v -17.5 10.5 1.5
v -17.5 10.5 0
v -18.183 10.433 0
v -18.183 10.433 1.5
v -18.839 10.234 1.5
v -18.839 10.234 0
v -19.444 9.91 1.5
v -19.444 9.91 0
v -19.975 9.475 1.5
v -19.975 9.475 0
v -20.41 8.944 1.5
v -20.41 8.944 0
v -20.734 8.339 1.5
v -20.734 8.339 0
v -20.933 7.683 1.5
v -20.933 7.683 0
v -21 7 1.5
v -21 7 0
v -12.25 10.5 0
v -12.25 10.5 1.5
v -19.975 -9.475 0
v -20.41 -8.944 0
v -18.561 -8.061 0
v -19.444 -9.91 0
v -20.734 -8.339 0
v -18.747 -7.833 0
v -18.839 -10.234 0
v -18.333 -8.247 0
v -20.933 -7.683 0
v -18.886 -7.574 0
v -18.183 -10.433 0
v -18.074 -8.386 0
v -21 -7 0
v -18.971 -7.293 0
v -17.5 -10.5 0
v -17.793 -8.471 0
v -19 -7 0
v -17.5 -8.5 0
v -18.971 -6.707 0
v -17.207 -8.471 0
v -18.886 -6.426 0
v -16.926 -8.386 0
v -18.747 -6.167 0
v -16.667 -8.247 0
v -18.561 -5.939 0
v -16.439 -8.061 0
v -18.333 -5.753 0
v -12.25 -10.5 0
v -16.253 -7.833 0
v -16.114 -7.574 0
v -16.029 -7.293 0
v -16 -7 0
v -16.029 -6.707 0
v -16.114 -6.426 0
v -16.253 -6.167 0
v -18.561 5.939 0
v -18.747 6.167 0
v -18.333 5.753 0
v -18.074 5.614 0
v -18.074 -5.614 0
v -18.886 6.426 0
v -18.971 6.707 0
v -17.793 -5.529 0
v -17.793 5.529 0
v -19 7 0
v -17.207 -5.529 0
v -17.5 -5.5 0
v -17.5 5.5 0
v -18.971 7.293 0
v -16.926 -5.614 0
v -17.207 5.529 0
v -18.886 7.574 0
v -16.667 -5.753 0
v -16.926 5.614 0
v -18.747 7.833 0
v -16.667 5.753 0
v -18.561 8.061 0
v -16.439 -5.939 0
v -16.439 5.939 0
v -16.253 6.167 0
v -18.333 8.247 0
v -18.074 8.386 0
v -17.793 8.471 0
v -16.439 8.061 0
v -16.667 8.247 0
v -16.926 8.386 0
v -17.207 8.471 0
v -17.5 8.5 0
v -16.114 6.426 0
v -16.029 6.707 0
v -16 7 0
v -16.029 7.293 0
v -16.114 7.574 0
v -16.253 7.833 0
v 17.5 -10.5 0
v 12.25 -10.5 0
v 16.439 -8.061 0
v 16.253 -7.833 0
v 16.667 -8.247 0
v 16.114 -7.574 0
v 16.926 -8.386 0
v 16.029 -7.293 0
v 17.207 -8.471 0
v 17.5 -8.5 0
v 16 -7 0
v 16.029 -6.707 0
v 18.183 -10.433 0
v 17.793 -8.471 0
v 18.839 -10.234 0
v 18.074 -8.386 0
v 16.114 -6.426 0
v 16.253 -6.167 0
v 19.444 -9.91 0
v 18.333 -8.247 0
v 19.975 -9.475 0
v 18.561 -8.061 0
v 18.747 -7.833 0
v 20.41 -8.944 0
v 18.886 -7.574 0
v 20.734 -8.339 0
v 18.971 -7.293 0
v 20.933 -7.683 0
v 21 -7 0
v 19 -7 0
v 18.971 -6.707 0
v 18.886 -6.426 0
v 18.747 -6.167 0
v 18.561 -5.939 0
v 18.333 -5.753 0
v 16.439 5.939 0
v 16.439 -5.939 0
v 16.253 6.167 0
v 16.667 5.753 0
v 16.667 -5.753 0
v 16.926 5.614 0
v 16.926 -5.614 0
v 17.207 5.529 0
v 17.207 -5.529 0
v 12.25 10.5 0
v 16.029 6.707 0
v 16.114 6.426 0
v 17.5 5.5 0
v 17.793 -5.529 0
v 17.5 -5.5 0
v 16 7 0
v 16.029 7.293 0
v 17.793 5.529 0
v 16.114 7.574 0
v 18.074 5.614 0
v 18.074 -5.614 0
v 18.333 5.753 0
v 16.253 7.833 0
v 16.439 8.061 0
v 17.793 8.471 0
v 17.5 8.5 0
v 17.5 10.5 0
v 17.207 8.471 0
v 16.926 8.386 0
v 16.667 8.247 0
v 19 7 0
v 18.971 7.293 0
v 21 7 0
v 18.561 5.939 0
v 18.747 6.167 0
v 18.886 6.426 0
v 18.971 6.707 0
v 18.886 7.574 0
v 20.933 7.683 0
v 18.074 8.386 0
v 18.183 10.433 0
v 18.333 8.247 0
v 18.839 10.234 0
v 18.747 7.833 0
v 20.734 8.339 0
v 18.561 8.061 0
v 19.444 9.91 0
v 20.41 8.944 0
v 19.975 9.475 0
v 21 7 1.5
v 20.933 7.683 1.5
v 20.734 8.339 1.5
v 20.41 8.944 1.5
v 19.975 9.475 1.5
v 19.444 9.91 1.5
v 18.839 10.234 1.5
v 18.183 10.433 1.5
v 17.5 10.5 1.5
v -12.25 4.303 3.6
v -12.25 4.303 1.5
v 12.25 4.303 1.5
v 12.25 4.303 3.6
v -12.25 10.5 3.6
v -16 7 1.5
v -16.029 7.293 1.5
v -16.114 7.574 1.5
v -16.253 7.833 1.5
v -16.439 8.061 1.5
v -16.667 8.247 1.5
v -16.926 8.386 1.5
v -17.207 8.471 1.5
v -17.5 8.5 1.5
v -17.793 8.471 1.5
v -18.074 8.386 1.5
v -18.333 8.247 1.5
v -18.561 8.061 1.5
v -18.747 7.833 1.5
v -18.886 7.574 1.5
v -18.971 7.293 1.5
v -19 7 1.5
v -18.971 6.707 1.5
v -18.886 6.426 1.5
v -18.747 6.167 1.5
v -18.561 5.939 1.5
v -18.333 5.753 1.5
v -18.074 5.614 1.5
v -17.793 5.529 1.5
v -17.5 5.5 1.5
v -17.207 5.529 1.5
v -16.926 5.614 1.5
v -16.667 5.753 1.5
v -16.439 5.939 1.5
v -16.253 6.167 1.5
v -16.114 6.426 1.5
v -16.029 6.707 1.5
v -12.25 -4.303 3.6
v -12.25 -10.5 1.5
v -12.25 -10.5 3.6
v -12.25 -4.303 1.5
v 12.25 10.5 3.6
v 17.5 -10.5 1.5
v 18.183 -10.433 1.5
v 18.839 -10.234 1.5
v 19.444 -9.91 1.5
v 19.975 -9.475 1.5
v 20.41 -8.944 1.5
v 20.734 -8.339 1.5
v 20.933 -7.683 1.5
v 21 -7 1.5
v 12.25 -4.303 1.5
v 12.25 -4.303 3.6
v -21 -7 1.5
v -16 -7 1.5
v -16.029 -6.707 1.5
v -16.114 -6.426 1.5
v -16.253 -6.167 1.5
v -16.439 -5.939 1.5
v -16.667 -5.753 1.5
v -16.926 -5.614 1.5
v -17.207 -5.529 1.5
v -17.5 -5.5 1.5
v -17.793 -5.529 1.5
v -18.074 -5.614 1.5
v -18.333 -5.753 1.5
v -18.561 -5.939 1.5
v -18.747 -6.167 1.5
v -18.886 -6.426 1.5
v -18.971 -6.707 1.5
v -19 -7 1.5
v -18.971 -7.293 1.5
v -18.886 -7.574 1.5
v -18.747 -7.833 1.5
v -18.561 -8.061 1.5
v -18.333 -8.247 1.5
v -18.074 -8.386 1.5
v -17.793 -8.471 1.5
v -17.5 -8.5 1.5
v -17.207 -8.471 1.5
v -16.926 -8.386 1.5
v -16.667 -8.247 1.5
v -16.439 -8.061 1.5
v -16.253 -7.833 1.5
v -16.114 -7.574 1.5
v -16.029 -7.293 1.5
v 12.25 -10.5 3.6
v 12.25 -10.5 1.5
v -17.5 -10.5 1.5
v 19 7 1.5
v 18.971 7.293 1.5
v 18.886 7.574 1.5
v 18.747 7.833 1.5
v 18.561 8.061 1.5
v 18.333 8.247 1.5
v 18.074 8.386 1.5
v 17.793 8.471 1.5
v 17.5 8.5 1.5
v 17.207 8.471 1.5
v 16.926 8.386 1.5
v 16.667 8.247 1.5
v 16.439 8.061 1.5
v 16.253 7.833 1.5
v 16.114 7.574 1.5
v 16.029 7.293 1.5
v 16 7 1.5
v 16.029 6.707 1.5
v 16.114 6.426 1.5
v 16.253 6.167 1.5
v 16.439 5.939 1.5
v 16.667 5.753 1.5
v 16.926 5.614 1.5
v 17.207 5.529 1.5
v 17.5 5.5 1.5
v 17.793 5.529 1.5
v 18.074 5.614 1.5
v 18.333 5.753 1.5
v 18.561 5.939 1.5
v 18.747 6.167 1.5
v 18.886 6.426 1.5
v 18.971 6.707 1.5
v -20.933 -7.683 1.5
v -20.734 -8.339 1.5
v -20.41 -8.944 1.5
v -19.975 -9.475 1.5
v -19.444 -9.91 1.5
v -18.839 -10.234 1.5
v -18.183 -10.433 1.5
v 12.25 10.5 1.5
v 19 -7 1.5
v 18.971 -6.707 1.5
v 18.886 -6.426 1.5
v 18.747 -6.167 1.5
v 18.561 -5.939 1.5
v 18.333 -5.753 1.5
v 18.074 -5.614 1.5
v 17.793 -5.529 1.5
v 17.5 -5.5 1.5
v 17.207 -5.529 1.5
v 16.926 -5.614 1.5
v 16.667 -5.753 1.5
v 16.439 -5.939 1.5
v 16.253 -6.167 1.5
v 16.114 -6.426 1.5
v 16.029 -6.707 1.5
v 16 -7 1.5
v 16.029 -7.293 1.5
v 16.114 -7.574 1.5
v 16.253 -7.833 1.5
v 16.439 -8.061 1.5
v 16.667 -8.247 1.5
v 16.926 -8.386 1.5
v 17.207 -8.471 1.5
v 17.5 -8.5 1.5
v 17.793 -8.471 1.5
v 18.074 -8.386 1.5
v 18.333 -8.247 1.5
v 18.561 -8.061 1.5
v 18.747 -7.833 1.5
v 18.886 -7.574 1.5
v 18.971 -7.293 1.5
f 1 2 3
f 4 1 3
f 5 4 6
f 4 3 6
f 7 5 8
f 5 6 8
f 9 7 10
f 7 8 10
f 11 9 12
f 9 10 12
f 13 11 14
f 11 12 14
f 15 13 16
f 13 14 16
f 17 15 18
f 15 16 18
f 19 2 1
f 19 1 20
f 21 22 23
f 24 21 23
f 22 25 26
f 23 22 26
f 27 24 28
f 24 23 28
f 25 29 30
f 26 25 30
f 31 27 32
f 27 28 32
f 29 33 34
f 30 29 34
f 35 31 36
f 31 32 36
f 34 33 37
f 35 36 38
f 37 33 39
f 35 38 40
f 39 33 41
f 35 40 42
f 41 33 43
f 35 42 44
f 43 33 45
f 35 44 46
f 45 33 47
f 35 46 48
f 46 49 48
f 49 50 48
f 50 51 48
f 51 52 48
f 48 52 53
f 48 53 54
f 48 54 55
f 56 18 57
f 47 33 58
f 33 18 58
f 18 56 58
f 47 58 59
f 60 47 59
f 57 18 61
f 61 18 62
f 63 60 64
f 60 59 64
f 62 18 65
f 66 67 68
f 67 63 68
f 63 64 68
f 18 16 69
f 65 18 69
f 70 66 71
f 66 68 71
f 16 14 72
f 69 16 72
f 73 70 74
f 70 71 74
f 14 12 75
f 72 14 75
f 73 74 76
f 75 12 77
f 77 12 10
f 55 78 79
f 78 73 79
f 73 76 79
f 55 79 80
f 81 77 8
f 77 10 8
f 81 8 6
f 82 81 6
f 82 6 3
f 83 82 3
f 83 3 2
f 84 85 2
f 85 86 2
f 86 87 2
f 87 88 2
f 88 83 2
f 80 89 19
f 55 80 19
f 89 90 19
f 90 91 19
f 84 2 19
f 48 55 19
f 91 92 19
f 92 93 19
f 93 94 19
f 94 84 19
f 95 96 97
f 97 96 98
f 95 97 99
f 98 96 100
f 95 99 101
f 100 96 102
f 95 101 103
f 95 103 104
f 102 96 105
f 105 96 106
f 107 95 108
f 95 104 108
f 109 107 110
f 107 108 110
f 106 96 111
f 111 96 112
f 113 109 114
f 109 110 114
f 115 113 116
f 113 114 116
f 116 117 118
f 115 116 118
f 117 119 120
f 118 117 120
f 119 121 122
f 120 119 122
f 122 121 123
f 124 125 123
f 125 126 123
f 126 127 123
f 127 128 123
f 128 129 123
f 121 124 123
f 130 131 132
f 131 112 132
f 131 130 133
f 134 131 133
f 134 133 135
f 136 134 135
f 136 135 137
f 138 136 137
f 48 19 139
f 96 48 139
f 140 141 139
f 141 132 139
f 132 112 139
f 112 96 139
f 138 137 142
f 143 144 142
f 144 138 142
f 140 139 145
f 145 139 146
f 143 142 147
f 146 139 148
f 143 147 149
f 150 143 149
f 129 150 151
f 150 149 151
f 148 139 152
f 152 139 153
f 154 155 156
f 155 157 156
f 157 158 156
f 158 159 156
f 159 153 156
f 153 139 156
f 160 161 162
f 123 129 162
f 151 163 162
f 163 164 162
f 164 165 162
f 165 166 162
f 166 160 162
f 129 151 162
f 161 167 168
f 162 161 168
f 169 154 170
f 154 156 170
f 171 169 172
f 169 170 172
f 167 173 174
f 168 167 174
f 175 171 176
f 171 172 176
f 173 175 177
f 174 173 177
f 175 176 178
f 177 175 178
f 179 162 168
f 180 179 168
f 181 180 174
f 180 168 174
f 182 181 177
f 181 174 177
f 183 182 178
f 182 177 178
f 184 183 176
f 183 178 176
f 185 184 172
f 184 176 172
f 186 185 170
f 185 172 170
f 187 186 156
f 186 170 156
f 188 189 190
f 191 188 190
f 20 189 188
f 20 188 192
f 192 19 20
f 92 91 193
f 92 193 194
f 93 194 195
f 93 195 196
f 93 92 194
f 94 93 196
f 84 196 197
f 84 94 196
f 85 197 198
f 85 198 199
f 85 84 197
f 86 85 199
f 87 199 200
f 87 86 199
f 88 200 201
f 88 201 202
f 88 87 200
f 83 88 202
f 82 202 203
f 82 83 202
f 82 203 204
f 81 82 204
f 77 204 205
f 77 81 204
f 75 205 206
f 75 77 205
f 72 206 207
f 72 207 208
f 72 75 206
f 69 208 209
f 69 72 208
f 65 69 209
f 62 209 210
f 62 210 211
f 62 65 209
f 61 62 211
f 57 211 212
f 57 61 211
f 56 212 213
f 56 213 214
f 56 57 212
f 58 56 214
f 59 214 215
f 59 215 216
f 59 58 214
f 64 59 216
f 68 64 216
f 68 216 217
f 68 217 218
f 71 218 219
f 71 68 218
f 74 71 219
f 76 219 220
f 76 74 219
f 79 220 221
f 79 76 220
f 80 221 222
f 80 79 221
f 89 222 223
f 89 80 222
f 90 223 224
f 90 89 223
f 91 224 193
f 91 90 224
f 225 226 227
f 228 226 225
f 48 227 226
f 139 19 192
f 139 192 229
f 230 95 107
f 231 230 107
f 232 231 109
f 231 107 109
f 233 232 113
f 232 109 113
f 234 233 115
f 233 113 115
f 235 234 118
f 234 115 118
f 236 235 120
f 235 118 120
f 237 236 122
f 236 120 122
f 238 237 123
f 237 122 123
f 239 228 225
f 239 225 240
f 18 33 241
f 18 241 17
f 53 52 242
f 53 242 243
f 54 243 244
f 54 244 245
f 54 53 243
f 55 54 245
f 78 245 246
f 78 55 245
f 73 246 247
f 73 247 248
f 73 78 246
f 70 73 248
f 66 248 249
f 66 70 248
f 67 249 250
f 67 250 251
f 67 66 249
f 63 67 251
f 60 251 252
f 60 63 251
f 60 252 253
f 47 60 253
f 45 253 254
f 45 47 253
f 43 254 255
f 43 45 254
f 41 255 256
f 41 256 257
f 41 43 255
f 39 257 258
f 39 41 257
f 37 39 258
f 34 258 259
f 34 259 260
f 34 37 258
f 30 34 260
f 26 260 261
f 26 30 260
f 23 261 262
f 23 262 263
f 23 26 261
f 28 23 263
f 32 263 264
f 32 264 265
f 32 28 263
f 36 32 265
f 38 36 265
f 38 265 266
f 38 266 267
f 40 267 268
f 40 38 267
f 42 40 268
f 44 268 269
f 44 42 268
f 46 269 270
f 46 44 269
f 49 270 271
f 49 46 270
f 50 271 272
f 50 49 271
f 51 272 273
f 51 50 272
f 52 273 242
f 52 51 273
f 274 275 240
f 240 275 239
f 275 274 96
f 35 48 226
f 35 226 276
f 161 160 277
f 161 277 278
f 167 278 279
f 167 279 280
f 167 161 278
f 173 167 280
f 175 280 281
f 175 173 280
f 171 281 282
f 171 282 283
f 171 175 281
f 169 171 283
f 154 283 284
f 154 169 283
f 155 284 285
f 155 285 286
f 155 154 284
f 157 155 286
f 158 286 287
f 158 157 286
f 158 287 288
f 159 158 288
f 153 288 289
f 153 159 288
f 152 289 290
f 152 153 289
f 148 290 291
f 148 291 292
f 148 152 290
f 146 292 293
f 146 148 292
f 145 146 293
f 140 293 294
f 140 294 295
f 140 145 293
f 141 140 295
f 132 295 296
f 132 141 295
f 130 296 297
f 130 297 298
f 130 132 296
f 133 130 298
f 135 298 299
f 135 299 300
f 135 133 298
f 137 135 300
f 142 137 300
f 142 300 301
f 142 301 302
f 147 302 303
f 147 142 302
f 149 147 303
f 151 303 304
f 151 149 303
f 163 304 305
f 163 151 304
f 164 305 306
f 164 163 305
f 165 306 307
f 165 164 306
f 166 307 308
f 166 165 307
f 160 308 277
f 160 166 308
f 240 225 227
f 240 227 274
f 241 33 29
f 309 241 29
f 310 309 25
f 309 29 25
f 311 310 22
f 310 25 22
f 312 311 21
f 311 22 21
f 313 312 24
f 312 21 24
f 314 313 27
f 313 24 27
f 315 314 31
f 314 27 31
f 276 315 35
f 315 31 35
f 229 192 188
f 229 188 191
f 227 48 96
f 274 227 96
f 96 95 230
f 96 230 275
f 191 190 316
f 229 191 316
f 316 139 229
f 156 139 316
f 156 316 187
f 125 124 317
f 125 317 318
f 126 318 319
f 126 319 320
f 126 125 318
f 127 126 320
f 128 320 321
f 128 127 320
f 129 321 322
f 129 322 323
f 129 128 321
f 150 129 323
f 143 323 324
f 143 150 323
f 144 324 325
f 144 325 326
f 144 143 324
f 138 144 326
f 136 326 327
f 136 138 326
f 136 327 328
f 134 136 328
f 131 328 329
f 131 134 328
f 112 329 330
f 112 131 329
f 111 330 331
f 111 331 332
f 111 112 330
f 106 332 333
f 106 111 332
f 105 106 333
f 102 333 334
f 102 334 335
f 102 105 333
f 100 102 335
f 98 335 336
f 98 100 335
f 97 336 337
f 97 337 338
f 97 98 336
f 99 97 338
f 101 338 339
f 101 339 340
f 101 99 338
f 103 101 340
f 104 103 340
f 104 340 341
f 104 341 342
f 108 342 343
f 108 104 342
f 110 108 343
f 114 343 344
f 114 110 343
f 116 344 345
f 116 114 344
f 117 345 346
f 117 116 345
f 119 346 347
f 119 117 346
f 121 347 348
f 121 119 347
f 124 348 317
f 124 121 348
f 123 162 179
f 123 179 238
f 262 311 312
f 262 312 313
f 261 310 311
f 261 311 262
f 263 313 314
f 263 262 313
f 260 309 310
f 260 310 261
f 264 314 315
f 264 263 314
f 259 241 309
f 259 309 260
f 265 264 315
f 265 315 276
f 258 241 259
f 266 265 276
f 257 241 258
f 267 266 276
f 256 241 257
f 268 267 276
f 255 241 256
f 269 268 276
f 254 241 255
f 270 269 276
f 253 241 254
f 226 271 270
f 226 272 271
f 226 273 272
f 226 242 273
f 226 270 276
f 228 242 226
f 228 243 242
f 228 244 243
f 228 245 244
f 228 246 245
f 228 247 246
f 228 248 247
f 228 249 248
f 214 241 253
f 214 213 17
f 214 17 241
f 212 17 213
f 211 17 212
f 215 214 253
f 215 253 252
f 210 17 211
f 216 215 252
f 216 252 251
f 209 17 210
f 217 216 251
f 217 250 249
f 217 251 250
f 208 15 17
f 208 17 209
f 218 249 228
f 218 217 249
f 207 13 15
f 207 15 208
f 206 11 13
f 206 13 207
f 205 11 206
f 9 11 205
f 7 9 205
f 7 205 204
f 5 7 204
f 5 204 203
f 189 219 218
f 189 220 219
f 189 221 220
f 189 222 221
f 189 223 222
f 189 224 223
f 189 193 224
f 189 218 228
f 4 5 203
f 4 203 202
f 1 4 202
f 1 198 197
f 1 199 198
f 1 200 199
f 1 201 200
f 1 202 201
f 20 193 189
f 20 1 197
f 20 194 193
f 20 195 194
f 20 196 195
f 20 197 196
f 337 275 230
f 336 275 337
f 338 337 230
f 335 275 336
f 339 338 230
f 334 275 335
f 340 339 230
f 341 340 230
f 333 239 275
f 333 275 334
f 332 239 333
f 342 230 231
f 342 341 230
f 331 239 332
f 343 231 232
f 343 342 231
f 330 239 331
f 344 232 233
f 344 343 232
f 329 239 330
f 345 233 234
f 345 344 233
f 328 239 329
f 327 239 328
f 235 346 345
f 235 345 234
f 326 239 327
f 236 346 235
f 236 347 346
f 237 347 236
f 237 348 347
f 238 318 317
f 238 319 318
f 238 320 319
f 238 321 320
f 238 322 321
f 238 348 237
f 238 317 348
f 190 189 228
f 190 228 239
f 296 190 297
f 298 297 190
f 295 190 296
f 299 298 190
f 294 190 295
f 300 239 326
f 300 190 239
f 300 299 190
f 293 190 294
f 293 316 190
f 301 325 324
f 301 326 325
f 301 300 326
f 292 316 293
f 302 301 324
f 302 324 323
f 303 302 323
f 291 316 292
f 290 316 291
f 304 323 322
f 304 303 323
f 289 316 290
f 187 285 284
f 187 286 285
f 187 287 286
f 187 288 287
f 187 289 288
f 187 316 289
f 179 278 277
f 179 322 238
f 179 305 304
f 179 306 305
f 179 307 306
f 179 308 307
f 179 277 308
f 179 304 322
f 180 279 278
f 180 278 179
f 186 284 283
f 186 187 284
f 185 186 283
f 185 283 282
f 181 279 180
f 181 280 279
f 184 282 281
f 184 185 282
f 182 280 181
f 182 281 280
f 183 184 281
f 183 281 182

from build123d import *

# Parameters (mm, degrees)
SKETCH_R     = 1.5
PAD_DEPTH    = 1.5
SKETCH001_W  = 24.5
SKETCH001_H  = 6.196515
PAD001_DEPTH = 3.6


with BuildPart() as part:
    # Sketch → Pad (new body)
    with BuildSketch(Plane.XY):
        with BuildLine():
            ThreePointArc((-17.5, 10.5), (-19.974874, 9.474874), (-21, 7))
            Line((-21, -7), (-21, 7))
            ThreePointArc((-21, -7), (-19.974874, -9.474874), (-17.5, -10.5))
            Line((17.5, -10.5), (-17.5, -10.5))
            ThreePointArc((17.5, -10.5), (19.974874, -9.474874), (21, -7))
            Line((21, 7), (21, -7))
            ThreePointArc((21, 7), (19.974874, 9.474874), (17.5, 10.5))
            Line((-17.5, 10.5), (17.5, 10.5))
        make_face()
        with Locations((-17.5, 7)):
            Circle(SKETCH_R, mode=Mode.SUBTRACT)
        with Locations((-17.5, -7)):
            Circle(SKETCH_R, mode=Mode.SUBTRACT)
        with Locations((17.5, 7)):
            Circle(SKETCH_R, mode=Mode.SUBTRACT)
        with Locations((17.5, -7)):
            Circle(SKETCH_R, mode=Mode.SUBTRACT)
    extrude(amount=PAD_DEPTH)

    # Sketch001 → Pad001 (join)
    with BuildSketch(Plane.XY):
        with Locations((0, 7.401743)):
            Rectangle(SKETCH001_W, SKETCH001_H)
        with Locations((0, -7.401743)):
            Rectangle(SKETCH001_W, SKETCH001_H)
    extrude(amount=PAD001_DEPTH)


solid = part.part
